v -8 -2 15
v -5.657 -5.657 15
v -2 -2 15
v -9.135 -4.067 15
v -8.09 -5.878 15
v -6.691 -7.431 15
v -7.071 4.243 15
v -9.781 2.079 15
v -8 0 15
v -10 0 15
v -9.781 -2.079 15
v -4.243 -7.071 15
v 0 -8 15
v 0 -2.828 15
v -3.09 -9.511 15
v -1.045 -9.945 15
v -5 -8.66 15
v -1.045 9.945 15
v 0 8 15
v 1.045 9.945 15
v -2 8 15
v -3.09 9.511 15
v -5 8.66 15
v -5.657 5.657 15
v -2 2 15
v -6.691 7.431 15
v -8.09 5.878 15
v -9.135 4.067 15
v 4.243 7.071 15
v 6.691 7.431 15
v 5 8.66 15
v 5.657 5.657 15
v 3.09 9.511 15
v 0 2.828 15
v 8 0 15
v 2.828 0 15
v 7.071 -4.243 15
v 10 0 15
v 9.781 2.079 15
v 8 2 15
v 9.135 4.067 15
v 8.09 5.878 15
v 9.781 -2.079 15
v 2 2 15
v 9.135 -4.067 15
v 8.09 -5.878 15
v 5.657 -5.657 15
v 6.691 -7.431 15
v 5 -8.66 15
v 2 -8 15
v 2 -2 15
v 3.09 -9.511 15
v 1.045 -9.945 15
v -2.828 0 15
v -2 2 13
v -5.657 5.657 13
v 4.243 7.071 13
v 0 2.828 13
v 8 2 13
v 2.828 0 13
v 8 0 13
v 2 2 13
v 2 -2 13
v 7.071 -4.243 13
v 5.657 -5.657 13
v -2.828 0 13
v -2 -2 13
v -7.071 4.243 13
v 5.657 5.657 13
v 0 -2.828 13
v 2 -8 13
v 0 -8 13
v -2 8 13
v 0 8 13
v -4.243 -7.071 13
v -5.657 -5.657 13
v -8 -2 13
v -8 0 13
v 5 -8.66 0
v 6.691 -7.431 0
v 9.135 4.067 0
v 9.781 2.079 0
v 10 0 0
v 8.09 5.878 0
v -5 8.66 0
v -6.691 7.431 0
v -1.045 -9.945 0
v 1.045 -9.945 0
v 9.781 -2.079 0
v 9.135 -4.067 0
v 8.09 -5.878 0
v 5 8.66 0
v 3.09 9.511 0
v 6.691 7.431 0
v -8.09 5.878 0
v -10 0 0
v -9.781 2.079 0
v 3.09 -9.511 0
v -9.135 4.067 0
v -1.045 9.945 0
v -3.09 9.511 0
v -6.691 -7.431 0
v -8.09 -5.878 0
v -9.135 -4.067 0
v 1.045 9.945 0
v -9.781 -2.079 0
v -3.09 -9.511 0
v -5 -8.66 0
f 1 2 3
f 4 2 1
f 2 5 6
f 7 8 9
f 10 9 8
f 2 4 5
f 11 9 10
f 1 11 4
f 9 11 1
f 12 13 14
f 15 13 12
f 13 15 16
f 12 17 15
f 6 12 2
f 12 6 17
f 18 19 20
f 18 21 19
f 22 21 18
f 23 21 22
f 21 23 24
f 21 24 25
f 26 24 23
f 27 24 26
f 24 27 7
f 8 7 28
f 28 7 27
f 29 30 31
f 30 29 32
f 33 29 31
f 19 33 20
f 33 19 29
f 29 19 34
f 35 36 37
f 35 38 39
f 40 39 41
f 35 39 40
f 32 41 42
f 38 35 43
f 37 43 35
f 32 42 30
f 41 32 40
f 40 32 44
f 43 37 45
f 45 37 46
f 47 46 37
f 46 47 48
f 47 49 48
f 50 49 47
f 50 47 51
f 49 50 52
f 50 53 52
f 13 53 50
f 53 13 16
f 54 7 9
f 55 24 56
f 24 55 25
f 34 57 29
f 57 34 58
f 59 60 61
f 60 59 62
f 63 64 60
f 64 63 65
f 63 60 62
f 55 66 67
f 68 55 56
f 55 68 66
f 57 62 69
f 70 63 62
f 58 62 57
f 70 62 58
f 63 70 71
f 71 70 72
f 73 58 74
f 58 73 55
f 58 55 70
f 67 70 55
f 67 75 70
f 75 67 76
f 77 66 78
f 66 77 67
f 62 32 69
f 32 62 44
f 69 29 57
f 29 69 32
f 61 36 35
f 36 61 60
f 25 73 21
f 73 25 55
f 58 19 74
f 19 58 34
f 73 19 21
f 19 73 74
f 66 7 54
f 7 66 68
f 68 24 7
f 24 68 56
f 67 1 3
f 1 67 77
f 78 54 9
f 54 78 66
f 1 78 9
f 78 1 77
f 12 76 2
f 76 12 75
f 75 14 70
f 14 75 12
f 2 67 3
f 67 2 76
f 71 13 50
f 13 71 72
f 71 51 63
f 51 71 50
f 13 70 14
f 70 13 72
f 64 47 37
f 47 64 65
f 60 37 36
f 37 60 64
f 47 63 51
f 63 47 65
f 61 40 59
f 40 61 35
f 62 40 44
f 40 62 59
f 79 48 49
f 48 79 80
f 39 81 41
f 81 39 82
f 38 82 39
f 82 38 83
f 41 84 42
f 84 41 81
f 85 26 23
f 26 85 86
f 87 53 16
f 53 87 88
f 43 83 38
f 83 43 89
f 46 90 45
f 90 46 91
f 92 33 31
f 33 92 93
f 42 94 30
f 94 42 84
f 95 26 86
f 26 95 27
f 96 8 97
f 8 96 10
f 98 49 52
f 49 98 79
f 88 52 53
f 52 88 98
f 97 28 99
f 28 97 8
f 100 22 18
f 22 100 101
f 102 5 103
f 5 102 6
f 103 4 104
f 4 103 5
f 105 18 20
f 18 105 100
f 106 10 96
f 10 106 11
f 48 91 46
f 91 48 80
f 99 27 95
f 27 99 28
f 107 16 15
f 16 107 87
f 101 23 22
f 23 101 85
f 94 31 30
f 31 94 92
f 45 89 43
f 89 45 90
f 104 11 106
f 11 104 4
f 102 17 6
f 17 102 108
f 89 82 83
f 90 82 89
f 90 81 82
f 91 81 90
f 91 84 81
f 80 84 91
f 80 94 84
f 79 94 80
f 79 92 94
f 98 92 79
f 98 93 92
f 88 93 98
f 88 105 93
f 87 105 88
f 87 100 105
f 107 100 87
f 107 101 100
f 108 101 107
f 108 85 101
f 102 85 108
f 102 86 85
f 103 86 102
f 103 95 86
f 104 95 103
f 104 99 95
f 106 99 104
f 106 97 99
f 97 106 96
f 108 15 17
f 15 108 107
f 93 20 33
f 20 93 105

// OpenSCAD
difference() {
    color( "DarkGreen", 1.0) cylinder( h=15, r=10);

    for(a=[1:8]) {
        rotate([0,0,a*45]) {
            translate([0, 0, 13]) cube([8,2,2]);
        }
    }
}
